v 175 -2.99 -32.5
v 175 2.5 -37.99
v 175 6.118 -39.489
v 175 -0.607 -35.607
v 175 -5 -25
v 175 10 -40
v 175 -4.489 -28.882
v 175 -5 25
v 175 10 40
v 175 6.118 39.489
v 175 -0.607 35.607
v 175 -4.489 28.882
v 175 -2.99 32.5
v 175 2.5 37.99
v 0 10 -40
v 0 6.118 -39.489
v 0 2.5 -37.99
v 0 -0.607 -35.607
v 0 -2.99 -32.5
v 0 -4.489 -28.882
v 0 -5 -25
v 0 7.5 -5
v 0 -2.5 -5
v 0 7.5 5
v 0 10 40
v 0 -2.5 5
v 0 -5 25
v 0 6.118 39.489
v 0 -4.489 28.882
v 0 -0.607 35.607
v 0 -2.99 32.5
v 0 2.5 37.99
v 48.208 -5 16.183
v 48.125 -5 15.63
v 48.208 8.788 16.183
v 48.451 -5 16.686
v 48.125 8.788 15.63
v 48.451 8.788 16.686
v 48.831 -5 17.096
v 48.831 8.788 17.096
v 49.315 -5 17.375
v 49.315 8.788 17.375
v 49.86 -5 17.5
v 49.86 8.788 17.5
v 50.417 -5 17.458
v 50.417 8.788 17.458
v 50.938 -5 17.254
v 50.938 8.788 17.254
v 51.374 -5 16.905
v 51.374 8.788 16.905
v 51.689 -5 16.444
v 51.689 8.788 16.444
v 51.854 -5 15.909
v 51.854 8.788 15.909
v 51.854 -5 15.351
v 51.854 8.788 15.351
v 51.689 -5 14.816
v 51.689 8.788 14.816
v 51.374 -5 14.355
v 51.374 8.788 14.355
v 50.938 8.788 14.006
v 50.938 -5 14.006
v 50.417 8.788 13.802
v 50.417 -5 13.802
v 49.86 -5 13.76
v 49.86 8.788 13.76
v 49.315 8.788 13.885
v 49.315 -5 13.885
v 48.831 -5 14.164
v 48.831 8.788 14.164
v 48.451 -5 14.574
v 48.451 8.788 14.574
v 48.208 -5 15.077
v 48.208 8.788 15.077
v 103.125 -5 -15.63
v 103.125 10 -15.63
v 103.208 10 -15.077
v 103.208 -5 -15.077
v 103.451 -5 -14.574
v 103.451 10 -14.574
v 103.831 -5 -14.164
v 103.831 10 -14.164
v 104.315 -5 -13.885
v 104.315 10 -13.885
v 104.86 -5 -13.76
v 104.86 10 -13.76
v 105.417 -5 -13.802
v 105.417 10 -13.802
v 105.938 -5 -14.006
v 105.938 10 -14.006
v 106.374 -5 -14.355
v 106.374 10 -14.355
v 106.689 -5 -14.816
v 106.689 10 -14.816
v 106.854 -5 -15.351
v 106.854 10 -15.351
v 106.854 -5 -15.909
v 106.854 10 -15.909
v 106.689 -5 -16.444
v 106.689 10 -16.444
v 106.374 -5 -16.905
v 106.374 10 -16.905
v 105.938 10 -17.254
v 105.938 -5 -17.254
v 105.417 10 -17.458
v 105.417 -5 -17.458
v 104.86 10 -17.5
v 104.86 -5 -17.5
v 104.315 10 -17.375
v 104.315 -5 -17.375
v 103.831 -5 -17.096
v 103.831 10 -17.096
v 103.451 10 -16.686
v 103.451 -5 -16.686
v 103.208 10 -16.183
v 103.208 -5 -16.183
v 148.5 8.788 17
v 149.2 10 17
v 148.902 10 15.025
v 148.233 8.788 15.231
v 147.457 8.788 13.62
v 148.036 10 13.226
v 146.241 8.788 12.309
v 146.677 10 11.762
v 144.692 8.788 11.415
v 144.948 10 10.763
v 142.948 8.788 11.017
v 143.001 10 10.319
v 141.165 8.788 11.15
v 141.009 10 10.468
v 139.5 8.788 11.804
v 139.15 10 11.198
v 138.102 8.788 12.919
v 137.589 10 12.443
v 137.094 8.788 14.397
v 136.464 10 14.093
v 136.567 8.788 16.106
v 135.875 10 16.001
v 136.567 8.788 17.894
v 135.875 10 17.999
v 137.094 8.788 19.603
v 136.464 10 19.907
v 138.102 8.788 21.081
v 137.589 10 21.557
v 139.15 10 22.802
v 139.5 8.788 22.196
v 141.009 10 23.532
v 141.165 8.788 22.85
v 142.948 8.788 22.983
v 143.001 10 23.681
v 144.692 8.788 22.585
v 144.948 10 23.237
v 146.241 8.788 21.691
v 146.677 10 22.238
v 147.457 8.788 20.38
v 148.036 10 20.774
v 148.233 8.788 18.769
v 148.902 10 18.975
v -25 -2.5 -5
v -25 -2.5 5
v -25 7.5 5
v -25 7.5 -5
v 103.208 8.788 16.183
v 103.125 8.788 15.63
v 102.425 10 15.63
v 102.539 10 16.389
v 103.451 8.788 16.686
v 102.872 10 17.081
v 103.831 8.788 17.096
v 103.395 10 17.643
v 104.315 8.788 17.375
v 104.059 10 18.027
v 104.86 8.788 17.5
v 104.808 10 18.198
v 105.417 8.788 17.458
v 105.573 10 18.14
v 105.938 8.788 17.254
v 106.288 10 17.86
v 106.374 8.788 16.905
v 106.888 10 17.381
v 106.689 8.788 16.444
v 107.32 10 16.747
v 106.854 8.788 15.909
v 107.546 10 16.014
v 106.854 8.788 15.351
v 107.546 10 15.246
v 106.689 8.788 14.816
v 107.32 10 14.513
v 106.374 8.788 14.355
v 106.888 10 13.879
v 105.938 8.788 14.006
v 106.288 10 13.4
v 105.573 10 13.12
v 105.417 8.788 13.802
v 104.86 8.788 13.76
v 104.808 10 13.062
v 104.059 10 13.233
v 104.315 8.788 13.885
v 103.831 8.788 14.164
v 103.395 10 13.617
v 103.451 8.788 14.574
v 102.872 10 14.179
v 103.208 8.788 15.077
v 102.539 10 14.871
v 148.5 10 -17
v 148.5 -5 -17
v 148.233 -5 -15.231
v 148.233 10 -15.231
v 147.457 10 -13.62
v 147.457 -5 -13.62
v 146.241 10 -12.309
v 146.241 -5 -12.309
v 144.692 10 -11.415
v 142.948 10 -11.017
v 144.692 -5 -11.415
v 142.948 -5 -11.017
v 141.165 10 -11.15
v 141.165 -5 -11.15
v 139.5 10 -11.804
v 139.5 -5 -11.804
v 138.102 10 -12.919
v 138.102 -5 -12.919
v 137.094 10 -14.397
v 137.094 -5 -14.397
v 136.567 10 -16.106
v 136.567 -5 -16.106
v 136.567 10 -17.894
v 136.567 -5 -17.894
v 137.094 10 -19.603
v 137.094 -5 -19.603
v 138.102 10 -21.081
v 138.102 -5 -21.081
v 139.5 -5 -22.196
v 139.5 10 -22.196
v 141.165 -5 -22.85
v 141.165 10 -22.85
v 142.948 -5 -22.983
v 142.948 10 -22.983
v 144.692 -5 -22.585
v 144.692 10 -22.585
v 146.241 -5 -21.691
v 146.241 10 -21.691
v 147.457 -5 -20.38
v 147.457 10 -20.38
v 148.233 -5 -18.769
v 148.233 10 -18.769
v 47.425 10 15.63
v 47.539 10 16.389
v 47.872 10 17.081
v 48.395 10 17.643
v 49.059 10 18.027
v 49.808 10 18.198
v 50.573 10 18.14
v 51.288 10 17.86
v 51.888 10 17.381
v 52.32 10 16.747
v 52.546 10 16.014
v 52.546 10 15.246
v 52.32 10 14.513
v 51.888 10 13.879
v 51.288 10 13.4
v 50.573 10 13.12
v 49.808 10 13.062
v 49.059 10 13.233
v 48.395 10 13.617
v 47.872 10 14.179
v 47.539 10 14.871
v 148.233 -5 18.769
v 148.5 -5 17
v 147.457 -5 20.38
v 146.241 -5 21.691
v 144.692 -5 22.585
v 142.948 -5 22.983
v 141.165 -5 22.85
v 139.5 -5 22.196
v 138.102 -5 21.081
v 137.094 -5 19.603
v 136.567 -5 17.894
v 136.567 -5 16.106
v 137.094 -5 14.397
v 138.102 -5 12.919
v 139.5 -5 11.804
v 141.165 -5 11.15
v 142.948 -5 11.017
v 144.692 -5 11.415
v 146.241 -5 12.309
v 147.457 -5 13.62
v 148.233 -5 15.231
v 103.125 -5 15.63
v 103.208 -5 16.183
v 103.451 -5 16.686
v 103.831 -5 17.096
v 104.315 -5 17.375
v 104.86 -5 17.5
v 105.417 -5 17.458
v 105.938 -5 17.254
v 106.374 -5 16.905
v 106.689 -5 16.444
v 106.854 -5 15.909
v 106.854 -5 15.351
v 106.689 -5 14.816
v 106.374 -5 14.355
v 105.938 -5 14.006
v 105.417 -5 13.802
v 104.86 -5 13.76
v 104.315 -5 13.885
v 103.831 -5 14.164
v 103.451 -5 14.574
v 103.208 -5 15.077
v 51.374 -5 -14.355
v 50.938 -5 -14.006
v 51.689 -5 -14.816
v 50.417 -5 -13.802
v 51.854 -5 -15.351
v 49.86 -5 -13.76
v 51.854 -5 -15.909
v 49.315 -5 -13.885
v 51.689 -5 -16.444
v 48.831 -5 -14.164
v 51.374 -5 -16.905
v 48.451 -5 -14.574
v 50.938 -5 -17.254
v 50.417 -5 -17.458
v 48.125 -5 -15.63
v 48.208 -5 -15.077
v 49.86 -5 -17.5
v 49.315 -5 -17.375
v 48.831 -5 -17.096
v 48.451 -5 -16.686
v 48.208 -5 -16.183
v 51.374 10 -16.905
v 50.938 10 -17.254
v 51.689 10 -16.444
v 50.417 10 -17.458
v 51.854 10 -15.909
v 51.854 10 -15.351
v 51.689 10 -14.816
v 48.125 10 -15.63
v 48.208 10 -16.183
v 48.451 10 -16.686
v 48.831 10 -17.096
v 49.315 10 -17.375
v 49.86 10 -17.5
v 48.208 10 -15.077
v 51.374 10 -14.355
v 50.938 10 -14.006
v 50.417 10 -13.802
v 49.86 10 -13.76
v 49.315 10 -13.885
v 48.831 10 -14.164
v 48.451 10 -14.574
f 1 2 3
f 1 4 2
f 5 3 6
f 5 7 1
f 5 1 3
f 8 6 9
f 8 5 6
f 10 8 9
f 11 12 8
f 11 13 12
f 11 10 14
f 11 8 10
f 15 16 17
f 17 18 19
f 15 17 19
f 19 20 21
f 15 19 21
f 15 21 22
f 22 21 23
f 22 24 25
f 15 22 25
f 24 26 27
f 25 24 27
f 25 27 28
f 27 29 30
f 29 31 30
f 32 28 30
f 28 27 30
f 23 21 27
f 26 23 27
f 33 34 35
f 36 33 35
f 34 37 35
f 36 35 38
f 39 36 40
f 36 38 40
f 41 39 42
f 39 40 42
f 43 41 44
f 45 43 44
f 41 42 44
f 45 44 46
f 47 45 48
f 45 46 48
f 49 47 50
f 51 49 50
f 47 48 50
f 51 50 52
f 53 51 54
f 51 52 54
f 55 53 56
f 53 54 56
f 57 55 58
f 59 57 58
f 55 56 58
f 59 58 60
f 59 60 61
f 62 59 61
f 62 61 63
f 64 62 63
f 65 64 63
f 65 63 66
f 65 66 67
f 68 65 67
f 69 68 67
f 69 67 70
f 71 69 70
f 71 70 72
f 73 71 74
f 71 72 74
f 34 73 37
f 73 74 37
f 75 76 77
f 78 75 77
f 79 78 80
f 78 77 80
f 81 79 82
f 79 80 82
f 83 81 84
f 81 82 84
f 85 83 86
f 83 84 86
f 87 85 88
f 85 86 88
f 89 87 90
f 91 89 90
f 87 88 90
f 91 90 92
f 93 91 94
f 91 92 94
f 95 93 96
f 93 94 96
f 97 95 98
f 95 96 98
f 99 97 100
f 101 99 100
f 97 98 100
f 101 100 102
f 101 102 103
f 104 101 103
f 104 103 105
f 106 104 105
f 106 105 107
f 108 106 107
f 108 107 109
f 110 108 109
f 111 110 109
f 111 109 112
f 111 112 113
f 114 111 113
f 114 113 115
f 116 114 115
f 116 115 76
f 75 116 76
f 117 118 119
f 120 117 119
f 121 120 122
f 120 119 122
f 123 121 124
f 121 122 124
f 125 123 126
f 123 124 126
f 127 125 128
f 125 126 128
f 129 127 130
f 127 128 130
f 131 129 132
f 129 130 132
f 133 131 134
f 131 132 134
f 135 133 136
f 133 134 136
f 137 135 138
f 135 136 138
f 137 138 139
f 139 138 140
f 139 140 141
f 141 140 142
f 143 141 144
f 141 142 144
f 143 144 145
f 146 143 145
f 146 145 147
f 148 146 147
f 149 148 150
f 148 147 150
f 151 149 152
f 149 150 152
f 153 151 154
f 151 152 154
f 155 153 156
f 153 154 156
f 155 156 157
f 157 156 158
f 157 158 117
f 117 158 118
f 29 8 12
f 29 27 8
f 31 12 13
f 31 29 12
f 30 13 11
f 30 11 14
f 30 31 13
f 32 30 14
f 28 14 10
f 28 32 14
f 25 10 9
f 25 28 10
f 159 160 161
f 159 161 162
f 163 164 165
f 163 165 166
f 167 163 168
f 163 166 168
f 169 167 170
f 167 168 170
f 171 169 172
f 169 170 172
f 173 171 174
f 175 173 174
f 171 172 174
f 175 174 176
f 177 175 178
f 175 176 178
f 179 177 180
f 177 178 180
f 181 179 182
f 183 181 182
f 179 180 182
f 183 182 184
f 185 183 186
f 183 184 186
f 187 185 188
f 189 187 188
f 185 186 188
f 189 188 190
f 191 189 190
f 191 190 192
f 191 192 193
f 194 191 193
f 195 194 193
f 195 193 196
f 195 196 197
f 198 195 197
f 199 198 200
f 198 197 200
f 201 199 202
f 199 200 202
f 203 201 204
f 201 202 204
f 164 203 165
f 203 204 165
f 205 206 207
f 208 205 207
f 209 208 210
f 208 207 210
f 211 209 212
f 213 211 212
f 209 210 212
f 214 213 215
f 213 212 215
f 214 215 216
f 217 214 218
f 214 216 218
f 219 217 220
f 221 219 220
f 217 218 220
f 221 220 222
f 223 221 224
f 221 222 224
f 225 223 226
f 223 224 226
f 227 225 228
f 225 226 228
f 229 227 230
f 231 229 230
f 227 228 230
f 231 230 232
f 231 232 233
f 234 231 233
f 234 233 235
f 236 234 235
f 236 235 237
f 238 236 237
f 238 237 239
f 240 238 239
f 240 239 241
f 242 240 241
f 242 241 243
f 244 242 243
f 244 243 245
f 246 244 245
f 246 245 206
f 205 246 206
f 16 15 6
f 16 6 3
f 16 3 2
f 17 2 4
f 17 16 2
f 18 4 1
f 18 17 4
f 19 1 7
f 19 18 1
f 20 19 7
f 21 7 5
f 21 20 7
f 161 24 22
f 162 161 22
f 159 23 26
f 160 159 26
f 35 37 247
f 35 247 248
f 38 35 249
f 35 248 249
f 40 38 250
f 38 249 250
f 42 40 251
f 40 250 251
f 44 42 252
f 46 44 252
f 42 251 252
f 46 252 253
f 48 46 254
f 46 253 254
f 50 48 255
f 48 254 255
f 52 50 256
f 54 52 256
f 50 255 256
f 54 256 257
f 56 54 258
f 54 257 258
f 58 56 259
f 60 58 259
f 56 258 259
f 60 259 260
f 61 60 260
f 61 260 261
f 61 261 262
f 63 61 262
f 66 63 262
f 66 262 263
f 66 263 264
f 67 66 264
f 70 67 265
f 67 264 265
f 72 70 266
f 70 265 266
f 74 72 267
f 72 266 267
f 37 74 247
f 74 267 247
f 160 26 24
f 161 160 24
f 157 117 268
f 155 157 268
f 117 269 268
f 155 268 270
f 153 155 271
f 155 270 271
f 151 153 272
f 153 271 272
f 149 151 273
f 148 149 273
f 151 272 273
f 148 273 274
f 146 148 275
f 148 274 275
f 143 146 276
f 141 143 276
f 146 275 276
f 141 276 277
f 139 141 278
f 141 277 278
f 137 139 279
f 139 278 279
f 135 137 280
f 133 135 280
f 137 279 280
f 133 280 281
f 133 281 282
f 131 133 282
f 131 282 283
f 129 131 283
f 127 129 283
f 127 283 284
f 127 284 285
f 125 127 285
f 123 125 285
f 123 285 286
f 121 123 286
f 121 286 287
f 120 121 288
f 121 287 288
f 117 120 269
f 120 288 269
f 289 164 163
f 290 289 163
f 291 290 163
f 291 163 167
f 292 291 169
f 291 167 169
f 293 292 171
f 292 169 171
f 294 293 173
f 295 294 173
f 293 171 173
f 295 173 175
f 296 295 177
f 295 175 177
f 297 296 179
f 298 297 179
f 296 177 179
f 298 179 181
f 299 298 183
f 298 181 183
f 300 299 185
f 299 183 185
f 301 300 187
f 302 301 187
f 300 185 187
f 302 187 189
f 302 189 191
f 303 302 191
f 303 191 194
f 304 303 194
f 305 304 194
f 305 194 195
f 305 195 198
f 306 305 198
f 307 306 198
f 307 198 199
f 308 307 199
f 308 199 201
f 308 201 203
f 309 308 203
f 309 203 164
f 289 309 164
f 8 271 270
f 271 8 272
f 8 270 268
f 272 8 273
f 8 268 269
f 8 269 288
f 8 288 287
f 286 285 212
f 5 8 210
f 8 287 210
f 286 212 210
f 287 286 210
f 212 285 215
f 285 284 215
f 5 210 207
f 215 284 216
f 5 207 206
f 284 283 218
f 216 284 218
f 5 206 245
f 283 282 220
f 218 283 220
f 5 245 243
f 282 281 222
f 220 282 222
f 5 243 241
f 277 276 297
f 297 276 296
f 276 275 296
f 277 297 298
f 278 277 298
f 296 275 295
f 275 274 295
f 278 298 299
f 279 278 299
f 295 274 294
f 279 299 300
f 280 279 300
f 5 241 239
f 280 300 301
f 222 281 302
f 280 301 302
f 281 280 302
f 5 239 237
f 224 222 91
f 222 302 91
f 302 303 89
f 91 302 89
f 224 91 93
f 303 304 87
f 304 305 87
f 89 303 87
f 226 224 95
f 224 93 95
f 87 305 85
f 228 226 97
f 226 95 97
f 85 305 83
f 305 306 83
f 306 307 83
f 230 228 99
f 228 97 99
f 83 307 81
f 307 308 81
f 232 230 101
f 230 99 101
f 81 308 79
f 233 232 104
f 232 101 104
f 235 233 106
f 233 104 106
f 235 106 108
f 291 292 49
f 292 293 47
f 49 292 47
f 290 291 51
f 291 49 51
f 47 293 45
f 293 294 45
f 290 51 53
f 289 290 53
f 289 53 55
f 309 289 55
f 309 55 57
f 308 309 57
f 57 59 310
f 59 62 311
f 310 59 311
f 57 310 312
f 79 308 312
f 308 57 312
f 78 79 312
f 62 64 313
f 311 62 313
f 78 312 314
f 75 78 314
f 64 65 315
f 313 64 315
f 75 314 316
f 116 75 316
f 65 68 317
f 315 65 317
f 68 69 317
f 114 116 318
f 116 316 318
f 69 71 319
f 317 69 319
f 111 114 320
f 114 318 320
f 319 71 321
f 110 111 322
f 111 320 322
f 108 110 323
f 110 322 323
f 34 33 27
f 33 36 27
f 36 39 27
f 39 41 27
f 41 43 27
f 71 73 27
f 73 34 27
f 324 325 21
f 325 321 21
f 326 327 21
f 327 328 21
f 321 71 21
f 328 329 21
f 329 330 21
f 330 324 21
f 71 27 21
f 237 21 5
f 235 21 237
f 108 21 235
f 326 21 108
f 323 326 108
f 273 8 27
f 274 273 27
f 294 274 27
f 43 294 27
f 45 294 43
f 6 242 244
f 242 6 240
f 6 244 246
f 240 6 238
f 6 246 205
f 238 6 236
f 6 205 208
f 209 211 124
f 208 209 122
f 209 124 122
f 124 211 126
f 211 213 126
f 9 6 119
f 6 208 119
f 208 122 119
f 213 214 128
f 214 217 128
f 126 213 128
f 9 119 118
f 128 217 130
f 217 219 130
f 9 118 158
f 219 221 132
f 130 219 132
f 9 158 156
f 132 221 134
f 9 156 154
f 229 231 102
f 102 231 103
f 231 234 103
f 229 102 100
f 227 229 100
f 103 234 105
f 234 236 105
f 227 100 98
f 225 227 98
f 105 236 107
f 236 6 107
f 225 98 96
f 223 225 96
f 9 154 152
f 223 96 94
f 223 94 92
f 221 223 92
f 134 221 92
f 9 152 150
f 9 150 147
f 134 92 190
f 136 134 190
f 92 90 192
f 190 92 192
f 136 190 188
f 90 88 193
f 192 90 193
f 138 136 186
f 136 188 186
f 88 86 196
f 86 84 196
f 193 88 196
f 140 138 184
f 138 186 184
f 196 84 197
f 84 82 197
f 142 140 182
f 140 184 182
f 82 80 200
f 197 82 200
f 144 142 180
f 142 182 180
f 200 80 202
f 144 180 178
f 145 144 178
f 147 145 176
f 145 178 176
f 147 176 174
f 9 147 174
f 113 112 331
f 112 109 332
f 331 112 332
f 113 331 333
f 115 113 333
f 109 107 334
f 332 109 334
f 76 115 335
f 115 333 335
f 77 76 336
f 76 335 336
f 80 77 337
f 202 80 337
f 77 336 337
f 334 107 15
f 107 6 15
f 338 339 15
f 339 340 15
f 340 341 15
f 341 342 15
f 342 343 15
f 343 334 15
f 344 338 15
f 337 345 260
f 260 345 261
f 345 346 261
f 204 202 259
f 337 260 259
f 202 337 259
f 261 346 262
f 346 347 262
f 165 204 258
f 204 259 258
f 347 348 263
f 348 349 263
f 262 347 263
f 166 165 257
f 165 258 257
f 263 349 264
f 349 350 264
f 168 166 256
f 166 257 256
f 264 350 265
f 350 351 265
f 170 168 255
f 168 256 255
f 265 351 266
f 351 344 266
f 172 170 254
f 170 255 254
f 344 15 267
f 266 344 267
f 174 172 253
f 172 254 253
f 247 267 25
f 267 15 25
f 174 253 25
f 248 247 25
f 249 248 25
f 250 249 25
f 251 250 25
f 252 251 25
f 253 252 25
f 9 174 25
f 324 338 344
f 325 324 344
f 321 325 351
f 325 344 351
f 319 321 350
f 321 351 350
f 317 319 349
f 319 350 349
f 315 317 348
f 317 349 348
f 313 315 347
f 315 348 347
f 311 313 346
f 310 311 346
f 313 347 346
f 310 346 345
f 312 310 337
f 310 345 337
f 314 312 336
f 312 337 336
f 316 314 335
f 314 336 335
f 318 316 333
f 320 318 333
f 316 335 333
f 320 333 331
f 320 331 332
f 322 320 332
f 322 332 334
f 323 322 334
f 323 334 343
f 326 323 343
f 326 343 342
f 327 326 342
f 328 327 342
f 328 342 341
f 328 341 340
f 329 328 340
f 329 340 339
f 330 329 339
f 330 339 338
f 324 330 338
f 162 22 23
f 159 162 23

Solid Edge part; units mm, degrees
sketch "Sketch1" plane through (0, 0, 0) normal (1, 0, 0) x (0, 1, 0)
  line L0 (-10, -40) -> (10, -40)
  line L1 (10, -40) -> (10, 40)
  line L2 (10, 40) -> (-10, 40)
  line L3 (-10, 40) -> (-10, -40)
  dimension "D1" = 20
  dimension "D2" = 80
extrude "Protrusion1" add sketch "Sketch1" along normal blind 175
sketch "Sketch2" plane through (61, -10, 0) normal (0, -1, 0) x (1, 0, 0)
  circle A0 centre (81.5, 17) radius 6
  dimension "D1" = 23
  dimension "D2" = 12
  dimension "D3" = 142.5
extrude "Cutout1" cut sketch "Sketch2" against normal through all and the other way through all
sketch "Sketch3" plane through (0, 0, 0) normal (-1, 0, 0) x (0, -1, 0)
  arc A0 (5, -25) -> (-10, -40) centre (-10, -25) cw
  line L0 (5, 25) -> (5, -25)
  arc A1 (5, 25) -> (-10, 40) centre (-10, 25) ccw
  dimension "D1" = 50
  dimension "D2" = 15
  dimension "D3" = 15
extrude "Cutout2" cut sketch "Sketch3" against normal through all material side at (0, -0.642, -35.642)
sketch "Sketch4" plane through (0, 2.399, 0) normal (-1, 0, 0) x (0, 0, 1)
  line L0 (-5, -4.899) -> (5, -4.899)
  line L1 (5, -4.899) -> (5, 5.101)
  line L2 (5, 5.101) -> (-5, 5.101)
  line L3 (-5, 5.101) -> (-5, -4.899)
  dimension "D1" = 10
extrude "Extrusionsausprägung_3" add sketch "Sketch4" along normal blind 25
sketch "Sketch5" plane through (86, 10, 0) normal (0, 1, 0) x (-1, 0, 0)
  circle A0 centre (36, 15.63) radius 1.875
  circle A1 centre (-19, 15.63) radius 1.875
  dimension "D1" = 3.75
  dimension "D2" = 37.5
  dimension "D3" = 55
  dimension "D4" = 24.37
  dimension "D5" = 24.37
extrude "Cutout3" cut sketch "Sketch5" against normal through all
chamfer "Fase_1" distance 0.7 angle 60 3 edges at (106.875, 10, 15.63) (142.5, 10, 23) (51.875, 10, 15.63) measured on face at (144.0833, 10, -27.4667)
mirror "Mirror1" about plane through (0, 0, 0) normal (0, 0, 1) of "Cutout1", "Cutout3"
properties part number "C1.1-A" material "Nylon, allgemein"
